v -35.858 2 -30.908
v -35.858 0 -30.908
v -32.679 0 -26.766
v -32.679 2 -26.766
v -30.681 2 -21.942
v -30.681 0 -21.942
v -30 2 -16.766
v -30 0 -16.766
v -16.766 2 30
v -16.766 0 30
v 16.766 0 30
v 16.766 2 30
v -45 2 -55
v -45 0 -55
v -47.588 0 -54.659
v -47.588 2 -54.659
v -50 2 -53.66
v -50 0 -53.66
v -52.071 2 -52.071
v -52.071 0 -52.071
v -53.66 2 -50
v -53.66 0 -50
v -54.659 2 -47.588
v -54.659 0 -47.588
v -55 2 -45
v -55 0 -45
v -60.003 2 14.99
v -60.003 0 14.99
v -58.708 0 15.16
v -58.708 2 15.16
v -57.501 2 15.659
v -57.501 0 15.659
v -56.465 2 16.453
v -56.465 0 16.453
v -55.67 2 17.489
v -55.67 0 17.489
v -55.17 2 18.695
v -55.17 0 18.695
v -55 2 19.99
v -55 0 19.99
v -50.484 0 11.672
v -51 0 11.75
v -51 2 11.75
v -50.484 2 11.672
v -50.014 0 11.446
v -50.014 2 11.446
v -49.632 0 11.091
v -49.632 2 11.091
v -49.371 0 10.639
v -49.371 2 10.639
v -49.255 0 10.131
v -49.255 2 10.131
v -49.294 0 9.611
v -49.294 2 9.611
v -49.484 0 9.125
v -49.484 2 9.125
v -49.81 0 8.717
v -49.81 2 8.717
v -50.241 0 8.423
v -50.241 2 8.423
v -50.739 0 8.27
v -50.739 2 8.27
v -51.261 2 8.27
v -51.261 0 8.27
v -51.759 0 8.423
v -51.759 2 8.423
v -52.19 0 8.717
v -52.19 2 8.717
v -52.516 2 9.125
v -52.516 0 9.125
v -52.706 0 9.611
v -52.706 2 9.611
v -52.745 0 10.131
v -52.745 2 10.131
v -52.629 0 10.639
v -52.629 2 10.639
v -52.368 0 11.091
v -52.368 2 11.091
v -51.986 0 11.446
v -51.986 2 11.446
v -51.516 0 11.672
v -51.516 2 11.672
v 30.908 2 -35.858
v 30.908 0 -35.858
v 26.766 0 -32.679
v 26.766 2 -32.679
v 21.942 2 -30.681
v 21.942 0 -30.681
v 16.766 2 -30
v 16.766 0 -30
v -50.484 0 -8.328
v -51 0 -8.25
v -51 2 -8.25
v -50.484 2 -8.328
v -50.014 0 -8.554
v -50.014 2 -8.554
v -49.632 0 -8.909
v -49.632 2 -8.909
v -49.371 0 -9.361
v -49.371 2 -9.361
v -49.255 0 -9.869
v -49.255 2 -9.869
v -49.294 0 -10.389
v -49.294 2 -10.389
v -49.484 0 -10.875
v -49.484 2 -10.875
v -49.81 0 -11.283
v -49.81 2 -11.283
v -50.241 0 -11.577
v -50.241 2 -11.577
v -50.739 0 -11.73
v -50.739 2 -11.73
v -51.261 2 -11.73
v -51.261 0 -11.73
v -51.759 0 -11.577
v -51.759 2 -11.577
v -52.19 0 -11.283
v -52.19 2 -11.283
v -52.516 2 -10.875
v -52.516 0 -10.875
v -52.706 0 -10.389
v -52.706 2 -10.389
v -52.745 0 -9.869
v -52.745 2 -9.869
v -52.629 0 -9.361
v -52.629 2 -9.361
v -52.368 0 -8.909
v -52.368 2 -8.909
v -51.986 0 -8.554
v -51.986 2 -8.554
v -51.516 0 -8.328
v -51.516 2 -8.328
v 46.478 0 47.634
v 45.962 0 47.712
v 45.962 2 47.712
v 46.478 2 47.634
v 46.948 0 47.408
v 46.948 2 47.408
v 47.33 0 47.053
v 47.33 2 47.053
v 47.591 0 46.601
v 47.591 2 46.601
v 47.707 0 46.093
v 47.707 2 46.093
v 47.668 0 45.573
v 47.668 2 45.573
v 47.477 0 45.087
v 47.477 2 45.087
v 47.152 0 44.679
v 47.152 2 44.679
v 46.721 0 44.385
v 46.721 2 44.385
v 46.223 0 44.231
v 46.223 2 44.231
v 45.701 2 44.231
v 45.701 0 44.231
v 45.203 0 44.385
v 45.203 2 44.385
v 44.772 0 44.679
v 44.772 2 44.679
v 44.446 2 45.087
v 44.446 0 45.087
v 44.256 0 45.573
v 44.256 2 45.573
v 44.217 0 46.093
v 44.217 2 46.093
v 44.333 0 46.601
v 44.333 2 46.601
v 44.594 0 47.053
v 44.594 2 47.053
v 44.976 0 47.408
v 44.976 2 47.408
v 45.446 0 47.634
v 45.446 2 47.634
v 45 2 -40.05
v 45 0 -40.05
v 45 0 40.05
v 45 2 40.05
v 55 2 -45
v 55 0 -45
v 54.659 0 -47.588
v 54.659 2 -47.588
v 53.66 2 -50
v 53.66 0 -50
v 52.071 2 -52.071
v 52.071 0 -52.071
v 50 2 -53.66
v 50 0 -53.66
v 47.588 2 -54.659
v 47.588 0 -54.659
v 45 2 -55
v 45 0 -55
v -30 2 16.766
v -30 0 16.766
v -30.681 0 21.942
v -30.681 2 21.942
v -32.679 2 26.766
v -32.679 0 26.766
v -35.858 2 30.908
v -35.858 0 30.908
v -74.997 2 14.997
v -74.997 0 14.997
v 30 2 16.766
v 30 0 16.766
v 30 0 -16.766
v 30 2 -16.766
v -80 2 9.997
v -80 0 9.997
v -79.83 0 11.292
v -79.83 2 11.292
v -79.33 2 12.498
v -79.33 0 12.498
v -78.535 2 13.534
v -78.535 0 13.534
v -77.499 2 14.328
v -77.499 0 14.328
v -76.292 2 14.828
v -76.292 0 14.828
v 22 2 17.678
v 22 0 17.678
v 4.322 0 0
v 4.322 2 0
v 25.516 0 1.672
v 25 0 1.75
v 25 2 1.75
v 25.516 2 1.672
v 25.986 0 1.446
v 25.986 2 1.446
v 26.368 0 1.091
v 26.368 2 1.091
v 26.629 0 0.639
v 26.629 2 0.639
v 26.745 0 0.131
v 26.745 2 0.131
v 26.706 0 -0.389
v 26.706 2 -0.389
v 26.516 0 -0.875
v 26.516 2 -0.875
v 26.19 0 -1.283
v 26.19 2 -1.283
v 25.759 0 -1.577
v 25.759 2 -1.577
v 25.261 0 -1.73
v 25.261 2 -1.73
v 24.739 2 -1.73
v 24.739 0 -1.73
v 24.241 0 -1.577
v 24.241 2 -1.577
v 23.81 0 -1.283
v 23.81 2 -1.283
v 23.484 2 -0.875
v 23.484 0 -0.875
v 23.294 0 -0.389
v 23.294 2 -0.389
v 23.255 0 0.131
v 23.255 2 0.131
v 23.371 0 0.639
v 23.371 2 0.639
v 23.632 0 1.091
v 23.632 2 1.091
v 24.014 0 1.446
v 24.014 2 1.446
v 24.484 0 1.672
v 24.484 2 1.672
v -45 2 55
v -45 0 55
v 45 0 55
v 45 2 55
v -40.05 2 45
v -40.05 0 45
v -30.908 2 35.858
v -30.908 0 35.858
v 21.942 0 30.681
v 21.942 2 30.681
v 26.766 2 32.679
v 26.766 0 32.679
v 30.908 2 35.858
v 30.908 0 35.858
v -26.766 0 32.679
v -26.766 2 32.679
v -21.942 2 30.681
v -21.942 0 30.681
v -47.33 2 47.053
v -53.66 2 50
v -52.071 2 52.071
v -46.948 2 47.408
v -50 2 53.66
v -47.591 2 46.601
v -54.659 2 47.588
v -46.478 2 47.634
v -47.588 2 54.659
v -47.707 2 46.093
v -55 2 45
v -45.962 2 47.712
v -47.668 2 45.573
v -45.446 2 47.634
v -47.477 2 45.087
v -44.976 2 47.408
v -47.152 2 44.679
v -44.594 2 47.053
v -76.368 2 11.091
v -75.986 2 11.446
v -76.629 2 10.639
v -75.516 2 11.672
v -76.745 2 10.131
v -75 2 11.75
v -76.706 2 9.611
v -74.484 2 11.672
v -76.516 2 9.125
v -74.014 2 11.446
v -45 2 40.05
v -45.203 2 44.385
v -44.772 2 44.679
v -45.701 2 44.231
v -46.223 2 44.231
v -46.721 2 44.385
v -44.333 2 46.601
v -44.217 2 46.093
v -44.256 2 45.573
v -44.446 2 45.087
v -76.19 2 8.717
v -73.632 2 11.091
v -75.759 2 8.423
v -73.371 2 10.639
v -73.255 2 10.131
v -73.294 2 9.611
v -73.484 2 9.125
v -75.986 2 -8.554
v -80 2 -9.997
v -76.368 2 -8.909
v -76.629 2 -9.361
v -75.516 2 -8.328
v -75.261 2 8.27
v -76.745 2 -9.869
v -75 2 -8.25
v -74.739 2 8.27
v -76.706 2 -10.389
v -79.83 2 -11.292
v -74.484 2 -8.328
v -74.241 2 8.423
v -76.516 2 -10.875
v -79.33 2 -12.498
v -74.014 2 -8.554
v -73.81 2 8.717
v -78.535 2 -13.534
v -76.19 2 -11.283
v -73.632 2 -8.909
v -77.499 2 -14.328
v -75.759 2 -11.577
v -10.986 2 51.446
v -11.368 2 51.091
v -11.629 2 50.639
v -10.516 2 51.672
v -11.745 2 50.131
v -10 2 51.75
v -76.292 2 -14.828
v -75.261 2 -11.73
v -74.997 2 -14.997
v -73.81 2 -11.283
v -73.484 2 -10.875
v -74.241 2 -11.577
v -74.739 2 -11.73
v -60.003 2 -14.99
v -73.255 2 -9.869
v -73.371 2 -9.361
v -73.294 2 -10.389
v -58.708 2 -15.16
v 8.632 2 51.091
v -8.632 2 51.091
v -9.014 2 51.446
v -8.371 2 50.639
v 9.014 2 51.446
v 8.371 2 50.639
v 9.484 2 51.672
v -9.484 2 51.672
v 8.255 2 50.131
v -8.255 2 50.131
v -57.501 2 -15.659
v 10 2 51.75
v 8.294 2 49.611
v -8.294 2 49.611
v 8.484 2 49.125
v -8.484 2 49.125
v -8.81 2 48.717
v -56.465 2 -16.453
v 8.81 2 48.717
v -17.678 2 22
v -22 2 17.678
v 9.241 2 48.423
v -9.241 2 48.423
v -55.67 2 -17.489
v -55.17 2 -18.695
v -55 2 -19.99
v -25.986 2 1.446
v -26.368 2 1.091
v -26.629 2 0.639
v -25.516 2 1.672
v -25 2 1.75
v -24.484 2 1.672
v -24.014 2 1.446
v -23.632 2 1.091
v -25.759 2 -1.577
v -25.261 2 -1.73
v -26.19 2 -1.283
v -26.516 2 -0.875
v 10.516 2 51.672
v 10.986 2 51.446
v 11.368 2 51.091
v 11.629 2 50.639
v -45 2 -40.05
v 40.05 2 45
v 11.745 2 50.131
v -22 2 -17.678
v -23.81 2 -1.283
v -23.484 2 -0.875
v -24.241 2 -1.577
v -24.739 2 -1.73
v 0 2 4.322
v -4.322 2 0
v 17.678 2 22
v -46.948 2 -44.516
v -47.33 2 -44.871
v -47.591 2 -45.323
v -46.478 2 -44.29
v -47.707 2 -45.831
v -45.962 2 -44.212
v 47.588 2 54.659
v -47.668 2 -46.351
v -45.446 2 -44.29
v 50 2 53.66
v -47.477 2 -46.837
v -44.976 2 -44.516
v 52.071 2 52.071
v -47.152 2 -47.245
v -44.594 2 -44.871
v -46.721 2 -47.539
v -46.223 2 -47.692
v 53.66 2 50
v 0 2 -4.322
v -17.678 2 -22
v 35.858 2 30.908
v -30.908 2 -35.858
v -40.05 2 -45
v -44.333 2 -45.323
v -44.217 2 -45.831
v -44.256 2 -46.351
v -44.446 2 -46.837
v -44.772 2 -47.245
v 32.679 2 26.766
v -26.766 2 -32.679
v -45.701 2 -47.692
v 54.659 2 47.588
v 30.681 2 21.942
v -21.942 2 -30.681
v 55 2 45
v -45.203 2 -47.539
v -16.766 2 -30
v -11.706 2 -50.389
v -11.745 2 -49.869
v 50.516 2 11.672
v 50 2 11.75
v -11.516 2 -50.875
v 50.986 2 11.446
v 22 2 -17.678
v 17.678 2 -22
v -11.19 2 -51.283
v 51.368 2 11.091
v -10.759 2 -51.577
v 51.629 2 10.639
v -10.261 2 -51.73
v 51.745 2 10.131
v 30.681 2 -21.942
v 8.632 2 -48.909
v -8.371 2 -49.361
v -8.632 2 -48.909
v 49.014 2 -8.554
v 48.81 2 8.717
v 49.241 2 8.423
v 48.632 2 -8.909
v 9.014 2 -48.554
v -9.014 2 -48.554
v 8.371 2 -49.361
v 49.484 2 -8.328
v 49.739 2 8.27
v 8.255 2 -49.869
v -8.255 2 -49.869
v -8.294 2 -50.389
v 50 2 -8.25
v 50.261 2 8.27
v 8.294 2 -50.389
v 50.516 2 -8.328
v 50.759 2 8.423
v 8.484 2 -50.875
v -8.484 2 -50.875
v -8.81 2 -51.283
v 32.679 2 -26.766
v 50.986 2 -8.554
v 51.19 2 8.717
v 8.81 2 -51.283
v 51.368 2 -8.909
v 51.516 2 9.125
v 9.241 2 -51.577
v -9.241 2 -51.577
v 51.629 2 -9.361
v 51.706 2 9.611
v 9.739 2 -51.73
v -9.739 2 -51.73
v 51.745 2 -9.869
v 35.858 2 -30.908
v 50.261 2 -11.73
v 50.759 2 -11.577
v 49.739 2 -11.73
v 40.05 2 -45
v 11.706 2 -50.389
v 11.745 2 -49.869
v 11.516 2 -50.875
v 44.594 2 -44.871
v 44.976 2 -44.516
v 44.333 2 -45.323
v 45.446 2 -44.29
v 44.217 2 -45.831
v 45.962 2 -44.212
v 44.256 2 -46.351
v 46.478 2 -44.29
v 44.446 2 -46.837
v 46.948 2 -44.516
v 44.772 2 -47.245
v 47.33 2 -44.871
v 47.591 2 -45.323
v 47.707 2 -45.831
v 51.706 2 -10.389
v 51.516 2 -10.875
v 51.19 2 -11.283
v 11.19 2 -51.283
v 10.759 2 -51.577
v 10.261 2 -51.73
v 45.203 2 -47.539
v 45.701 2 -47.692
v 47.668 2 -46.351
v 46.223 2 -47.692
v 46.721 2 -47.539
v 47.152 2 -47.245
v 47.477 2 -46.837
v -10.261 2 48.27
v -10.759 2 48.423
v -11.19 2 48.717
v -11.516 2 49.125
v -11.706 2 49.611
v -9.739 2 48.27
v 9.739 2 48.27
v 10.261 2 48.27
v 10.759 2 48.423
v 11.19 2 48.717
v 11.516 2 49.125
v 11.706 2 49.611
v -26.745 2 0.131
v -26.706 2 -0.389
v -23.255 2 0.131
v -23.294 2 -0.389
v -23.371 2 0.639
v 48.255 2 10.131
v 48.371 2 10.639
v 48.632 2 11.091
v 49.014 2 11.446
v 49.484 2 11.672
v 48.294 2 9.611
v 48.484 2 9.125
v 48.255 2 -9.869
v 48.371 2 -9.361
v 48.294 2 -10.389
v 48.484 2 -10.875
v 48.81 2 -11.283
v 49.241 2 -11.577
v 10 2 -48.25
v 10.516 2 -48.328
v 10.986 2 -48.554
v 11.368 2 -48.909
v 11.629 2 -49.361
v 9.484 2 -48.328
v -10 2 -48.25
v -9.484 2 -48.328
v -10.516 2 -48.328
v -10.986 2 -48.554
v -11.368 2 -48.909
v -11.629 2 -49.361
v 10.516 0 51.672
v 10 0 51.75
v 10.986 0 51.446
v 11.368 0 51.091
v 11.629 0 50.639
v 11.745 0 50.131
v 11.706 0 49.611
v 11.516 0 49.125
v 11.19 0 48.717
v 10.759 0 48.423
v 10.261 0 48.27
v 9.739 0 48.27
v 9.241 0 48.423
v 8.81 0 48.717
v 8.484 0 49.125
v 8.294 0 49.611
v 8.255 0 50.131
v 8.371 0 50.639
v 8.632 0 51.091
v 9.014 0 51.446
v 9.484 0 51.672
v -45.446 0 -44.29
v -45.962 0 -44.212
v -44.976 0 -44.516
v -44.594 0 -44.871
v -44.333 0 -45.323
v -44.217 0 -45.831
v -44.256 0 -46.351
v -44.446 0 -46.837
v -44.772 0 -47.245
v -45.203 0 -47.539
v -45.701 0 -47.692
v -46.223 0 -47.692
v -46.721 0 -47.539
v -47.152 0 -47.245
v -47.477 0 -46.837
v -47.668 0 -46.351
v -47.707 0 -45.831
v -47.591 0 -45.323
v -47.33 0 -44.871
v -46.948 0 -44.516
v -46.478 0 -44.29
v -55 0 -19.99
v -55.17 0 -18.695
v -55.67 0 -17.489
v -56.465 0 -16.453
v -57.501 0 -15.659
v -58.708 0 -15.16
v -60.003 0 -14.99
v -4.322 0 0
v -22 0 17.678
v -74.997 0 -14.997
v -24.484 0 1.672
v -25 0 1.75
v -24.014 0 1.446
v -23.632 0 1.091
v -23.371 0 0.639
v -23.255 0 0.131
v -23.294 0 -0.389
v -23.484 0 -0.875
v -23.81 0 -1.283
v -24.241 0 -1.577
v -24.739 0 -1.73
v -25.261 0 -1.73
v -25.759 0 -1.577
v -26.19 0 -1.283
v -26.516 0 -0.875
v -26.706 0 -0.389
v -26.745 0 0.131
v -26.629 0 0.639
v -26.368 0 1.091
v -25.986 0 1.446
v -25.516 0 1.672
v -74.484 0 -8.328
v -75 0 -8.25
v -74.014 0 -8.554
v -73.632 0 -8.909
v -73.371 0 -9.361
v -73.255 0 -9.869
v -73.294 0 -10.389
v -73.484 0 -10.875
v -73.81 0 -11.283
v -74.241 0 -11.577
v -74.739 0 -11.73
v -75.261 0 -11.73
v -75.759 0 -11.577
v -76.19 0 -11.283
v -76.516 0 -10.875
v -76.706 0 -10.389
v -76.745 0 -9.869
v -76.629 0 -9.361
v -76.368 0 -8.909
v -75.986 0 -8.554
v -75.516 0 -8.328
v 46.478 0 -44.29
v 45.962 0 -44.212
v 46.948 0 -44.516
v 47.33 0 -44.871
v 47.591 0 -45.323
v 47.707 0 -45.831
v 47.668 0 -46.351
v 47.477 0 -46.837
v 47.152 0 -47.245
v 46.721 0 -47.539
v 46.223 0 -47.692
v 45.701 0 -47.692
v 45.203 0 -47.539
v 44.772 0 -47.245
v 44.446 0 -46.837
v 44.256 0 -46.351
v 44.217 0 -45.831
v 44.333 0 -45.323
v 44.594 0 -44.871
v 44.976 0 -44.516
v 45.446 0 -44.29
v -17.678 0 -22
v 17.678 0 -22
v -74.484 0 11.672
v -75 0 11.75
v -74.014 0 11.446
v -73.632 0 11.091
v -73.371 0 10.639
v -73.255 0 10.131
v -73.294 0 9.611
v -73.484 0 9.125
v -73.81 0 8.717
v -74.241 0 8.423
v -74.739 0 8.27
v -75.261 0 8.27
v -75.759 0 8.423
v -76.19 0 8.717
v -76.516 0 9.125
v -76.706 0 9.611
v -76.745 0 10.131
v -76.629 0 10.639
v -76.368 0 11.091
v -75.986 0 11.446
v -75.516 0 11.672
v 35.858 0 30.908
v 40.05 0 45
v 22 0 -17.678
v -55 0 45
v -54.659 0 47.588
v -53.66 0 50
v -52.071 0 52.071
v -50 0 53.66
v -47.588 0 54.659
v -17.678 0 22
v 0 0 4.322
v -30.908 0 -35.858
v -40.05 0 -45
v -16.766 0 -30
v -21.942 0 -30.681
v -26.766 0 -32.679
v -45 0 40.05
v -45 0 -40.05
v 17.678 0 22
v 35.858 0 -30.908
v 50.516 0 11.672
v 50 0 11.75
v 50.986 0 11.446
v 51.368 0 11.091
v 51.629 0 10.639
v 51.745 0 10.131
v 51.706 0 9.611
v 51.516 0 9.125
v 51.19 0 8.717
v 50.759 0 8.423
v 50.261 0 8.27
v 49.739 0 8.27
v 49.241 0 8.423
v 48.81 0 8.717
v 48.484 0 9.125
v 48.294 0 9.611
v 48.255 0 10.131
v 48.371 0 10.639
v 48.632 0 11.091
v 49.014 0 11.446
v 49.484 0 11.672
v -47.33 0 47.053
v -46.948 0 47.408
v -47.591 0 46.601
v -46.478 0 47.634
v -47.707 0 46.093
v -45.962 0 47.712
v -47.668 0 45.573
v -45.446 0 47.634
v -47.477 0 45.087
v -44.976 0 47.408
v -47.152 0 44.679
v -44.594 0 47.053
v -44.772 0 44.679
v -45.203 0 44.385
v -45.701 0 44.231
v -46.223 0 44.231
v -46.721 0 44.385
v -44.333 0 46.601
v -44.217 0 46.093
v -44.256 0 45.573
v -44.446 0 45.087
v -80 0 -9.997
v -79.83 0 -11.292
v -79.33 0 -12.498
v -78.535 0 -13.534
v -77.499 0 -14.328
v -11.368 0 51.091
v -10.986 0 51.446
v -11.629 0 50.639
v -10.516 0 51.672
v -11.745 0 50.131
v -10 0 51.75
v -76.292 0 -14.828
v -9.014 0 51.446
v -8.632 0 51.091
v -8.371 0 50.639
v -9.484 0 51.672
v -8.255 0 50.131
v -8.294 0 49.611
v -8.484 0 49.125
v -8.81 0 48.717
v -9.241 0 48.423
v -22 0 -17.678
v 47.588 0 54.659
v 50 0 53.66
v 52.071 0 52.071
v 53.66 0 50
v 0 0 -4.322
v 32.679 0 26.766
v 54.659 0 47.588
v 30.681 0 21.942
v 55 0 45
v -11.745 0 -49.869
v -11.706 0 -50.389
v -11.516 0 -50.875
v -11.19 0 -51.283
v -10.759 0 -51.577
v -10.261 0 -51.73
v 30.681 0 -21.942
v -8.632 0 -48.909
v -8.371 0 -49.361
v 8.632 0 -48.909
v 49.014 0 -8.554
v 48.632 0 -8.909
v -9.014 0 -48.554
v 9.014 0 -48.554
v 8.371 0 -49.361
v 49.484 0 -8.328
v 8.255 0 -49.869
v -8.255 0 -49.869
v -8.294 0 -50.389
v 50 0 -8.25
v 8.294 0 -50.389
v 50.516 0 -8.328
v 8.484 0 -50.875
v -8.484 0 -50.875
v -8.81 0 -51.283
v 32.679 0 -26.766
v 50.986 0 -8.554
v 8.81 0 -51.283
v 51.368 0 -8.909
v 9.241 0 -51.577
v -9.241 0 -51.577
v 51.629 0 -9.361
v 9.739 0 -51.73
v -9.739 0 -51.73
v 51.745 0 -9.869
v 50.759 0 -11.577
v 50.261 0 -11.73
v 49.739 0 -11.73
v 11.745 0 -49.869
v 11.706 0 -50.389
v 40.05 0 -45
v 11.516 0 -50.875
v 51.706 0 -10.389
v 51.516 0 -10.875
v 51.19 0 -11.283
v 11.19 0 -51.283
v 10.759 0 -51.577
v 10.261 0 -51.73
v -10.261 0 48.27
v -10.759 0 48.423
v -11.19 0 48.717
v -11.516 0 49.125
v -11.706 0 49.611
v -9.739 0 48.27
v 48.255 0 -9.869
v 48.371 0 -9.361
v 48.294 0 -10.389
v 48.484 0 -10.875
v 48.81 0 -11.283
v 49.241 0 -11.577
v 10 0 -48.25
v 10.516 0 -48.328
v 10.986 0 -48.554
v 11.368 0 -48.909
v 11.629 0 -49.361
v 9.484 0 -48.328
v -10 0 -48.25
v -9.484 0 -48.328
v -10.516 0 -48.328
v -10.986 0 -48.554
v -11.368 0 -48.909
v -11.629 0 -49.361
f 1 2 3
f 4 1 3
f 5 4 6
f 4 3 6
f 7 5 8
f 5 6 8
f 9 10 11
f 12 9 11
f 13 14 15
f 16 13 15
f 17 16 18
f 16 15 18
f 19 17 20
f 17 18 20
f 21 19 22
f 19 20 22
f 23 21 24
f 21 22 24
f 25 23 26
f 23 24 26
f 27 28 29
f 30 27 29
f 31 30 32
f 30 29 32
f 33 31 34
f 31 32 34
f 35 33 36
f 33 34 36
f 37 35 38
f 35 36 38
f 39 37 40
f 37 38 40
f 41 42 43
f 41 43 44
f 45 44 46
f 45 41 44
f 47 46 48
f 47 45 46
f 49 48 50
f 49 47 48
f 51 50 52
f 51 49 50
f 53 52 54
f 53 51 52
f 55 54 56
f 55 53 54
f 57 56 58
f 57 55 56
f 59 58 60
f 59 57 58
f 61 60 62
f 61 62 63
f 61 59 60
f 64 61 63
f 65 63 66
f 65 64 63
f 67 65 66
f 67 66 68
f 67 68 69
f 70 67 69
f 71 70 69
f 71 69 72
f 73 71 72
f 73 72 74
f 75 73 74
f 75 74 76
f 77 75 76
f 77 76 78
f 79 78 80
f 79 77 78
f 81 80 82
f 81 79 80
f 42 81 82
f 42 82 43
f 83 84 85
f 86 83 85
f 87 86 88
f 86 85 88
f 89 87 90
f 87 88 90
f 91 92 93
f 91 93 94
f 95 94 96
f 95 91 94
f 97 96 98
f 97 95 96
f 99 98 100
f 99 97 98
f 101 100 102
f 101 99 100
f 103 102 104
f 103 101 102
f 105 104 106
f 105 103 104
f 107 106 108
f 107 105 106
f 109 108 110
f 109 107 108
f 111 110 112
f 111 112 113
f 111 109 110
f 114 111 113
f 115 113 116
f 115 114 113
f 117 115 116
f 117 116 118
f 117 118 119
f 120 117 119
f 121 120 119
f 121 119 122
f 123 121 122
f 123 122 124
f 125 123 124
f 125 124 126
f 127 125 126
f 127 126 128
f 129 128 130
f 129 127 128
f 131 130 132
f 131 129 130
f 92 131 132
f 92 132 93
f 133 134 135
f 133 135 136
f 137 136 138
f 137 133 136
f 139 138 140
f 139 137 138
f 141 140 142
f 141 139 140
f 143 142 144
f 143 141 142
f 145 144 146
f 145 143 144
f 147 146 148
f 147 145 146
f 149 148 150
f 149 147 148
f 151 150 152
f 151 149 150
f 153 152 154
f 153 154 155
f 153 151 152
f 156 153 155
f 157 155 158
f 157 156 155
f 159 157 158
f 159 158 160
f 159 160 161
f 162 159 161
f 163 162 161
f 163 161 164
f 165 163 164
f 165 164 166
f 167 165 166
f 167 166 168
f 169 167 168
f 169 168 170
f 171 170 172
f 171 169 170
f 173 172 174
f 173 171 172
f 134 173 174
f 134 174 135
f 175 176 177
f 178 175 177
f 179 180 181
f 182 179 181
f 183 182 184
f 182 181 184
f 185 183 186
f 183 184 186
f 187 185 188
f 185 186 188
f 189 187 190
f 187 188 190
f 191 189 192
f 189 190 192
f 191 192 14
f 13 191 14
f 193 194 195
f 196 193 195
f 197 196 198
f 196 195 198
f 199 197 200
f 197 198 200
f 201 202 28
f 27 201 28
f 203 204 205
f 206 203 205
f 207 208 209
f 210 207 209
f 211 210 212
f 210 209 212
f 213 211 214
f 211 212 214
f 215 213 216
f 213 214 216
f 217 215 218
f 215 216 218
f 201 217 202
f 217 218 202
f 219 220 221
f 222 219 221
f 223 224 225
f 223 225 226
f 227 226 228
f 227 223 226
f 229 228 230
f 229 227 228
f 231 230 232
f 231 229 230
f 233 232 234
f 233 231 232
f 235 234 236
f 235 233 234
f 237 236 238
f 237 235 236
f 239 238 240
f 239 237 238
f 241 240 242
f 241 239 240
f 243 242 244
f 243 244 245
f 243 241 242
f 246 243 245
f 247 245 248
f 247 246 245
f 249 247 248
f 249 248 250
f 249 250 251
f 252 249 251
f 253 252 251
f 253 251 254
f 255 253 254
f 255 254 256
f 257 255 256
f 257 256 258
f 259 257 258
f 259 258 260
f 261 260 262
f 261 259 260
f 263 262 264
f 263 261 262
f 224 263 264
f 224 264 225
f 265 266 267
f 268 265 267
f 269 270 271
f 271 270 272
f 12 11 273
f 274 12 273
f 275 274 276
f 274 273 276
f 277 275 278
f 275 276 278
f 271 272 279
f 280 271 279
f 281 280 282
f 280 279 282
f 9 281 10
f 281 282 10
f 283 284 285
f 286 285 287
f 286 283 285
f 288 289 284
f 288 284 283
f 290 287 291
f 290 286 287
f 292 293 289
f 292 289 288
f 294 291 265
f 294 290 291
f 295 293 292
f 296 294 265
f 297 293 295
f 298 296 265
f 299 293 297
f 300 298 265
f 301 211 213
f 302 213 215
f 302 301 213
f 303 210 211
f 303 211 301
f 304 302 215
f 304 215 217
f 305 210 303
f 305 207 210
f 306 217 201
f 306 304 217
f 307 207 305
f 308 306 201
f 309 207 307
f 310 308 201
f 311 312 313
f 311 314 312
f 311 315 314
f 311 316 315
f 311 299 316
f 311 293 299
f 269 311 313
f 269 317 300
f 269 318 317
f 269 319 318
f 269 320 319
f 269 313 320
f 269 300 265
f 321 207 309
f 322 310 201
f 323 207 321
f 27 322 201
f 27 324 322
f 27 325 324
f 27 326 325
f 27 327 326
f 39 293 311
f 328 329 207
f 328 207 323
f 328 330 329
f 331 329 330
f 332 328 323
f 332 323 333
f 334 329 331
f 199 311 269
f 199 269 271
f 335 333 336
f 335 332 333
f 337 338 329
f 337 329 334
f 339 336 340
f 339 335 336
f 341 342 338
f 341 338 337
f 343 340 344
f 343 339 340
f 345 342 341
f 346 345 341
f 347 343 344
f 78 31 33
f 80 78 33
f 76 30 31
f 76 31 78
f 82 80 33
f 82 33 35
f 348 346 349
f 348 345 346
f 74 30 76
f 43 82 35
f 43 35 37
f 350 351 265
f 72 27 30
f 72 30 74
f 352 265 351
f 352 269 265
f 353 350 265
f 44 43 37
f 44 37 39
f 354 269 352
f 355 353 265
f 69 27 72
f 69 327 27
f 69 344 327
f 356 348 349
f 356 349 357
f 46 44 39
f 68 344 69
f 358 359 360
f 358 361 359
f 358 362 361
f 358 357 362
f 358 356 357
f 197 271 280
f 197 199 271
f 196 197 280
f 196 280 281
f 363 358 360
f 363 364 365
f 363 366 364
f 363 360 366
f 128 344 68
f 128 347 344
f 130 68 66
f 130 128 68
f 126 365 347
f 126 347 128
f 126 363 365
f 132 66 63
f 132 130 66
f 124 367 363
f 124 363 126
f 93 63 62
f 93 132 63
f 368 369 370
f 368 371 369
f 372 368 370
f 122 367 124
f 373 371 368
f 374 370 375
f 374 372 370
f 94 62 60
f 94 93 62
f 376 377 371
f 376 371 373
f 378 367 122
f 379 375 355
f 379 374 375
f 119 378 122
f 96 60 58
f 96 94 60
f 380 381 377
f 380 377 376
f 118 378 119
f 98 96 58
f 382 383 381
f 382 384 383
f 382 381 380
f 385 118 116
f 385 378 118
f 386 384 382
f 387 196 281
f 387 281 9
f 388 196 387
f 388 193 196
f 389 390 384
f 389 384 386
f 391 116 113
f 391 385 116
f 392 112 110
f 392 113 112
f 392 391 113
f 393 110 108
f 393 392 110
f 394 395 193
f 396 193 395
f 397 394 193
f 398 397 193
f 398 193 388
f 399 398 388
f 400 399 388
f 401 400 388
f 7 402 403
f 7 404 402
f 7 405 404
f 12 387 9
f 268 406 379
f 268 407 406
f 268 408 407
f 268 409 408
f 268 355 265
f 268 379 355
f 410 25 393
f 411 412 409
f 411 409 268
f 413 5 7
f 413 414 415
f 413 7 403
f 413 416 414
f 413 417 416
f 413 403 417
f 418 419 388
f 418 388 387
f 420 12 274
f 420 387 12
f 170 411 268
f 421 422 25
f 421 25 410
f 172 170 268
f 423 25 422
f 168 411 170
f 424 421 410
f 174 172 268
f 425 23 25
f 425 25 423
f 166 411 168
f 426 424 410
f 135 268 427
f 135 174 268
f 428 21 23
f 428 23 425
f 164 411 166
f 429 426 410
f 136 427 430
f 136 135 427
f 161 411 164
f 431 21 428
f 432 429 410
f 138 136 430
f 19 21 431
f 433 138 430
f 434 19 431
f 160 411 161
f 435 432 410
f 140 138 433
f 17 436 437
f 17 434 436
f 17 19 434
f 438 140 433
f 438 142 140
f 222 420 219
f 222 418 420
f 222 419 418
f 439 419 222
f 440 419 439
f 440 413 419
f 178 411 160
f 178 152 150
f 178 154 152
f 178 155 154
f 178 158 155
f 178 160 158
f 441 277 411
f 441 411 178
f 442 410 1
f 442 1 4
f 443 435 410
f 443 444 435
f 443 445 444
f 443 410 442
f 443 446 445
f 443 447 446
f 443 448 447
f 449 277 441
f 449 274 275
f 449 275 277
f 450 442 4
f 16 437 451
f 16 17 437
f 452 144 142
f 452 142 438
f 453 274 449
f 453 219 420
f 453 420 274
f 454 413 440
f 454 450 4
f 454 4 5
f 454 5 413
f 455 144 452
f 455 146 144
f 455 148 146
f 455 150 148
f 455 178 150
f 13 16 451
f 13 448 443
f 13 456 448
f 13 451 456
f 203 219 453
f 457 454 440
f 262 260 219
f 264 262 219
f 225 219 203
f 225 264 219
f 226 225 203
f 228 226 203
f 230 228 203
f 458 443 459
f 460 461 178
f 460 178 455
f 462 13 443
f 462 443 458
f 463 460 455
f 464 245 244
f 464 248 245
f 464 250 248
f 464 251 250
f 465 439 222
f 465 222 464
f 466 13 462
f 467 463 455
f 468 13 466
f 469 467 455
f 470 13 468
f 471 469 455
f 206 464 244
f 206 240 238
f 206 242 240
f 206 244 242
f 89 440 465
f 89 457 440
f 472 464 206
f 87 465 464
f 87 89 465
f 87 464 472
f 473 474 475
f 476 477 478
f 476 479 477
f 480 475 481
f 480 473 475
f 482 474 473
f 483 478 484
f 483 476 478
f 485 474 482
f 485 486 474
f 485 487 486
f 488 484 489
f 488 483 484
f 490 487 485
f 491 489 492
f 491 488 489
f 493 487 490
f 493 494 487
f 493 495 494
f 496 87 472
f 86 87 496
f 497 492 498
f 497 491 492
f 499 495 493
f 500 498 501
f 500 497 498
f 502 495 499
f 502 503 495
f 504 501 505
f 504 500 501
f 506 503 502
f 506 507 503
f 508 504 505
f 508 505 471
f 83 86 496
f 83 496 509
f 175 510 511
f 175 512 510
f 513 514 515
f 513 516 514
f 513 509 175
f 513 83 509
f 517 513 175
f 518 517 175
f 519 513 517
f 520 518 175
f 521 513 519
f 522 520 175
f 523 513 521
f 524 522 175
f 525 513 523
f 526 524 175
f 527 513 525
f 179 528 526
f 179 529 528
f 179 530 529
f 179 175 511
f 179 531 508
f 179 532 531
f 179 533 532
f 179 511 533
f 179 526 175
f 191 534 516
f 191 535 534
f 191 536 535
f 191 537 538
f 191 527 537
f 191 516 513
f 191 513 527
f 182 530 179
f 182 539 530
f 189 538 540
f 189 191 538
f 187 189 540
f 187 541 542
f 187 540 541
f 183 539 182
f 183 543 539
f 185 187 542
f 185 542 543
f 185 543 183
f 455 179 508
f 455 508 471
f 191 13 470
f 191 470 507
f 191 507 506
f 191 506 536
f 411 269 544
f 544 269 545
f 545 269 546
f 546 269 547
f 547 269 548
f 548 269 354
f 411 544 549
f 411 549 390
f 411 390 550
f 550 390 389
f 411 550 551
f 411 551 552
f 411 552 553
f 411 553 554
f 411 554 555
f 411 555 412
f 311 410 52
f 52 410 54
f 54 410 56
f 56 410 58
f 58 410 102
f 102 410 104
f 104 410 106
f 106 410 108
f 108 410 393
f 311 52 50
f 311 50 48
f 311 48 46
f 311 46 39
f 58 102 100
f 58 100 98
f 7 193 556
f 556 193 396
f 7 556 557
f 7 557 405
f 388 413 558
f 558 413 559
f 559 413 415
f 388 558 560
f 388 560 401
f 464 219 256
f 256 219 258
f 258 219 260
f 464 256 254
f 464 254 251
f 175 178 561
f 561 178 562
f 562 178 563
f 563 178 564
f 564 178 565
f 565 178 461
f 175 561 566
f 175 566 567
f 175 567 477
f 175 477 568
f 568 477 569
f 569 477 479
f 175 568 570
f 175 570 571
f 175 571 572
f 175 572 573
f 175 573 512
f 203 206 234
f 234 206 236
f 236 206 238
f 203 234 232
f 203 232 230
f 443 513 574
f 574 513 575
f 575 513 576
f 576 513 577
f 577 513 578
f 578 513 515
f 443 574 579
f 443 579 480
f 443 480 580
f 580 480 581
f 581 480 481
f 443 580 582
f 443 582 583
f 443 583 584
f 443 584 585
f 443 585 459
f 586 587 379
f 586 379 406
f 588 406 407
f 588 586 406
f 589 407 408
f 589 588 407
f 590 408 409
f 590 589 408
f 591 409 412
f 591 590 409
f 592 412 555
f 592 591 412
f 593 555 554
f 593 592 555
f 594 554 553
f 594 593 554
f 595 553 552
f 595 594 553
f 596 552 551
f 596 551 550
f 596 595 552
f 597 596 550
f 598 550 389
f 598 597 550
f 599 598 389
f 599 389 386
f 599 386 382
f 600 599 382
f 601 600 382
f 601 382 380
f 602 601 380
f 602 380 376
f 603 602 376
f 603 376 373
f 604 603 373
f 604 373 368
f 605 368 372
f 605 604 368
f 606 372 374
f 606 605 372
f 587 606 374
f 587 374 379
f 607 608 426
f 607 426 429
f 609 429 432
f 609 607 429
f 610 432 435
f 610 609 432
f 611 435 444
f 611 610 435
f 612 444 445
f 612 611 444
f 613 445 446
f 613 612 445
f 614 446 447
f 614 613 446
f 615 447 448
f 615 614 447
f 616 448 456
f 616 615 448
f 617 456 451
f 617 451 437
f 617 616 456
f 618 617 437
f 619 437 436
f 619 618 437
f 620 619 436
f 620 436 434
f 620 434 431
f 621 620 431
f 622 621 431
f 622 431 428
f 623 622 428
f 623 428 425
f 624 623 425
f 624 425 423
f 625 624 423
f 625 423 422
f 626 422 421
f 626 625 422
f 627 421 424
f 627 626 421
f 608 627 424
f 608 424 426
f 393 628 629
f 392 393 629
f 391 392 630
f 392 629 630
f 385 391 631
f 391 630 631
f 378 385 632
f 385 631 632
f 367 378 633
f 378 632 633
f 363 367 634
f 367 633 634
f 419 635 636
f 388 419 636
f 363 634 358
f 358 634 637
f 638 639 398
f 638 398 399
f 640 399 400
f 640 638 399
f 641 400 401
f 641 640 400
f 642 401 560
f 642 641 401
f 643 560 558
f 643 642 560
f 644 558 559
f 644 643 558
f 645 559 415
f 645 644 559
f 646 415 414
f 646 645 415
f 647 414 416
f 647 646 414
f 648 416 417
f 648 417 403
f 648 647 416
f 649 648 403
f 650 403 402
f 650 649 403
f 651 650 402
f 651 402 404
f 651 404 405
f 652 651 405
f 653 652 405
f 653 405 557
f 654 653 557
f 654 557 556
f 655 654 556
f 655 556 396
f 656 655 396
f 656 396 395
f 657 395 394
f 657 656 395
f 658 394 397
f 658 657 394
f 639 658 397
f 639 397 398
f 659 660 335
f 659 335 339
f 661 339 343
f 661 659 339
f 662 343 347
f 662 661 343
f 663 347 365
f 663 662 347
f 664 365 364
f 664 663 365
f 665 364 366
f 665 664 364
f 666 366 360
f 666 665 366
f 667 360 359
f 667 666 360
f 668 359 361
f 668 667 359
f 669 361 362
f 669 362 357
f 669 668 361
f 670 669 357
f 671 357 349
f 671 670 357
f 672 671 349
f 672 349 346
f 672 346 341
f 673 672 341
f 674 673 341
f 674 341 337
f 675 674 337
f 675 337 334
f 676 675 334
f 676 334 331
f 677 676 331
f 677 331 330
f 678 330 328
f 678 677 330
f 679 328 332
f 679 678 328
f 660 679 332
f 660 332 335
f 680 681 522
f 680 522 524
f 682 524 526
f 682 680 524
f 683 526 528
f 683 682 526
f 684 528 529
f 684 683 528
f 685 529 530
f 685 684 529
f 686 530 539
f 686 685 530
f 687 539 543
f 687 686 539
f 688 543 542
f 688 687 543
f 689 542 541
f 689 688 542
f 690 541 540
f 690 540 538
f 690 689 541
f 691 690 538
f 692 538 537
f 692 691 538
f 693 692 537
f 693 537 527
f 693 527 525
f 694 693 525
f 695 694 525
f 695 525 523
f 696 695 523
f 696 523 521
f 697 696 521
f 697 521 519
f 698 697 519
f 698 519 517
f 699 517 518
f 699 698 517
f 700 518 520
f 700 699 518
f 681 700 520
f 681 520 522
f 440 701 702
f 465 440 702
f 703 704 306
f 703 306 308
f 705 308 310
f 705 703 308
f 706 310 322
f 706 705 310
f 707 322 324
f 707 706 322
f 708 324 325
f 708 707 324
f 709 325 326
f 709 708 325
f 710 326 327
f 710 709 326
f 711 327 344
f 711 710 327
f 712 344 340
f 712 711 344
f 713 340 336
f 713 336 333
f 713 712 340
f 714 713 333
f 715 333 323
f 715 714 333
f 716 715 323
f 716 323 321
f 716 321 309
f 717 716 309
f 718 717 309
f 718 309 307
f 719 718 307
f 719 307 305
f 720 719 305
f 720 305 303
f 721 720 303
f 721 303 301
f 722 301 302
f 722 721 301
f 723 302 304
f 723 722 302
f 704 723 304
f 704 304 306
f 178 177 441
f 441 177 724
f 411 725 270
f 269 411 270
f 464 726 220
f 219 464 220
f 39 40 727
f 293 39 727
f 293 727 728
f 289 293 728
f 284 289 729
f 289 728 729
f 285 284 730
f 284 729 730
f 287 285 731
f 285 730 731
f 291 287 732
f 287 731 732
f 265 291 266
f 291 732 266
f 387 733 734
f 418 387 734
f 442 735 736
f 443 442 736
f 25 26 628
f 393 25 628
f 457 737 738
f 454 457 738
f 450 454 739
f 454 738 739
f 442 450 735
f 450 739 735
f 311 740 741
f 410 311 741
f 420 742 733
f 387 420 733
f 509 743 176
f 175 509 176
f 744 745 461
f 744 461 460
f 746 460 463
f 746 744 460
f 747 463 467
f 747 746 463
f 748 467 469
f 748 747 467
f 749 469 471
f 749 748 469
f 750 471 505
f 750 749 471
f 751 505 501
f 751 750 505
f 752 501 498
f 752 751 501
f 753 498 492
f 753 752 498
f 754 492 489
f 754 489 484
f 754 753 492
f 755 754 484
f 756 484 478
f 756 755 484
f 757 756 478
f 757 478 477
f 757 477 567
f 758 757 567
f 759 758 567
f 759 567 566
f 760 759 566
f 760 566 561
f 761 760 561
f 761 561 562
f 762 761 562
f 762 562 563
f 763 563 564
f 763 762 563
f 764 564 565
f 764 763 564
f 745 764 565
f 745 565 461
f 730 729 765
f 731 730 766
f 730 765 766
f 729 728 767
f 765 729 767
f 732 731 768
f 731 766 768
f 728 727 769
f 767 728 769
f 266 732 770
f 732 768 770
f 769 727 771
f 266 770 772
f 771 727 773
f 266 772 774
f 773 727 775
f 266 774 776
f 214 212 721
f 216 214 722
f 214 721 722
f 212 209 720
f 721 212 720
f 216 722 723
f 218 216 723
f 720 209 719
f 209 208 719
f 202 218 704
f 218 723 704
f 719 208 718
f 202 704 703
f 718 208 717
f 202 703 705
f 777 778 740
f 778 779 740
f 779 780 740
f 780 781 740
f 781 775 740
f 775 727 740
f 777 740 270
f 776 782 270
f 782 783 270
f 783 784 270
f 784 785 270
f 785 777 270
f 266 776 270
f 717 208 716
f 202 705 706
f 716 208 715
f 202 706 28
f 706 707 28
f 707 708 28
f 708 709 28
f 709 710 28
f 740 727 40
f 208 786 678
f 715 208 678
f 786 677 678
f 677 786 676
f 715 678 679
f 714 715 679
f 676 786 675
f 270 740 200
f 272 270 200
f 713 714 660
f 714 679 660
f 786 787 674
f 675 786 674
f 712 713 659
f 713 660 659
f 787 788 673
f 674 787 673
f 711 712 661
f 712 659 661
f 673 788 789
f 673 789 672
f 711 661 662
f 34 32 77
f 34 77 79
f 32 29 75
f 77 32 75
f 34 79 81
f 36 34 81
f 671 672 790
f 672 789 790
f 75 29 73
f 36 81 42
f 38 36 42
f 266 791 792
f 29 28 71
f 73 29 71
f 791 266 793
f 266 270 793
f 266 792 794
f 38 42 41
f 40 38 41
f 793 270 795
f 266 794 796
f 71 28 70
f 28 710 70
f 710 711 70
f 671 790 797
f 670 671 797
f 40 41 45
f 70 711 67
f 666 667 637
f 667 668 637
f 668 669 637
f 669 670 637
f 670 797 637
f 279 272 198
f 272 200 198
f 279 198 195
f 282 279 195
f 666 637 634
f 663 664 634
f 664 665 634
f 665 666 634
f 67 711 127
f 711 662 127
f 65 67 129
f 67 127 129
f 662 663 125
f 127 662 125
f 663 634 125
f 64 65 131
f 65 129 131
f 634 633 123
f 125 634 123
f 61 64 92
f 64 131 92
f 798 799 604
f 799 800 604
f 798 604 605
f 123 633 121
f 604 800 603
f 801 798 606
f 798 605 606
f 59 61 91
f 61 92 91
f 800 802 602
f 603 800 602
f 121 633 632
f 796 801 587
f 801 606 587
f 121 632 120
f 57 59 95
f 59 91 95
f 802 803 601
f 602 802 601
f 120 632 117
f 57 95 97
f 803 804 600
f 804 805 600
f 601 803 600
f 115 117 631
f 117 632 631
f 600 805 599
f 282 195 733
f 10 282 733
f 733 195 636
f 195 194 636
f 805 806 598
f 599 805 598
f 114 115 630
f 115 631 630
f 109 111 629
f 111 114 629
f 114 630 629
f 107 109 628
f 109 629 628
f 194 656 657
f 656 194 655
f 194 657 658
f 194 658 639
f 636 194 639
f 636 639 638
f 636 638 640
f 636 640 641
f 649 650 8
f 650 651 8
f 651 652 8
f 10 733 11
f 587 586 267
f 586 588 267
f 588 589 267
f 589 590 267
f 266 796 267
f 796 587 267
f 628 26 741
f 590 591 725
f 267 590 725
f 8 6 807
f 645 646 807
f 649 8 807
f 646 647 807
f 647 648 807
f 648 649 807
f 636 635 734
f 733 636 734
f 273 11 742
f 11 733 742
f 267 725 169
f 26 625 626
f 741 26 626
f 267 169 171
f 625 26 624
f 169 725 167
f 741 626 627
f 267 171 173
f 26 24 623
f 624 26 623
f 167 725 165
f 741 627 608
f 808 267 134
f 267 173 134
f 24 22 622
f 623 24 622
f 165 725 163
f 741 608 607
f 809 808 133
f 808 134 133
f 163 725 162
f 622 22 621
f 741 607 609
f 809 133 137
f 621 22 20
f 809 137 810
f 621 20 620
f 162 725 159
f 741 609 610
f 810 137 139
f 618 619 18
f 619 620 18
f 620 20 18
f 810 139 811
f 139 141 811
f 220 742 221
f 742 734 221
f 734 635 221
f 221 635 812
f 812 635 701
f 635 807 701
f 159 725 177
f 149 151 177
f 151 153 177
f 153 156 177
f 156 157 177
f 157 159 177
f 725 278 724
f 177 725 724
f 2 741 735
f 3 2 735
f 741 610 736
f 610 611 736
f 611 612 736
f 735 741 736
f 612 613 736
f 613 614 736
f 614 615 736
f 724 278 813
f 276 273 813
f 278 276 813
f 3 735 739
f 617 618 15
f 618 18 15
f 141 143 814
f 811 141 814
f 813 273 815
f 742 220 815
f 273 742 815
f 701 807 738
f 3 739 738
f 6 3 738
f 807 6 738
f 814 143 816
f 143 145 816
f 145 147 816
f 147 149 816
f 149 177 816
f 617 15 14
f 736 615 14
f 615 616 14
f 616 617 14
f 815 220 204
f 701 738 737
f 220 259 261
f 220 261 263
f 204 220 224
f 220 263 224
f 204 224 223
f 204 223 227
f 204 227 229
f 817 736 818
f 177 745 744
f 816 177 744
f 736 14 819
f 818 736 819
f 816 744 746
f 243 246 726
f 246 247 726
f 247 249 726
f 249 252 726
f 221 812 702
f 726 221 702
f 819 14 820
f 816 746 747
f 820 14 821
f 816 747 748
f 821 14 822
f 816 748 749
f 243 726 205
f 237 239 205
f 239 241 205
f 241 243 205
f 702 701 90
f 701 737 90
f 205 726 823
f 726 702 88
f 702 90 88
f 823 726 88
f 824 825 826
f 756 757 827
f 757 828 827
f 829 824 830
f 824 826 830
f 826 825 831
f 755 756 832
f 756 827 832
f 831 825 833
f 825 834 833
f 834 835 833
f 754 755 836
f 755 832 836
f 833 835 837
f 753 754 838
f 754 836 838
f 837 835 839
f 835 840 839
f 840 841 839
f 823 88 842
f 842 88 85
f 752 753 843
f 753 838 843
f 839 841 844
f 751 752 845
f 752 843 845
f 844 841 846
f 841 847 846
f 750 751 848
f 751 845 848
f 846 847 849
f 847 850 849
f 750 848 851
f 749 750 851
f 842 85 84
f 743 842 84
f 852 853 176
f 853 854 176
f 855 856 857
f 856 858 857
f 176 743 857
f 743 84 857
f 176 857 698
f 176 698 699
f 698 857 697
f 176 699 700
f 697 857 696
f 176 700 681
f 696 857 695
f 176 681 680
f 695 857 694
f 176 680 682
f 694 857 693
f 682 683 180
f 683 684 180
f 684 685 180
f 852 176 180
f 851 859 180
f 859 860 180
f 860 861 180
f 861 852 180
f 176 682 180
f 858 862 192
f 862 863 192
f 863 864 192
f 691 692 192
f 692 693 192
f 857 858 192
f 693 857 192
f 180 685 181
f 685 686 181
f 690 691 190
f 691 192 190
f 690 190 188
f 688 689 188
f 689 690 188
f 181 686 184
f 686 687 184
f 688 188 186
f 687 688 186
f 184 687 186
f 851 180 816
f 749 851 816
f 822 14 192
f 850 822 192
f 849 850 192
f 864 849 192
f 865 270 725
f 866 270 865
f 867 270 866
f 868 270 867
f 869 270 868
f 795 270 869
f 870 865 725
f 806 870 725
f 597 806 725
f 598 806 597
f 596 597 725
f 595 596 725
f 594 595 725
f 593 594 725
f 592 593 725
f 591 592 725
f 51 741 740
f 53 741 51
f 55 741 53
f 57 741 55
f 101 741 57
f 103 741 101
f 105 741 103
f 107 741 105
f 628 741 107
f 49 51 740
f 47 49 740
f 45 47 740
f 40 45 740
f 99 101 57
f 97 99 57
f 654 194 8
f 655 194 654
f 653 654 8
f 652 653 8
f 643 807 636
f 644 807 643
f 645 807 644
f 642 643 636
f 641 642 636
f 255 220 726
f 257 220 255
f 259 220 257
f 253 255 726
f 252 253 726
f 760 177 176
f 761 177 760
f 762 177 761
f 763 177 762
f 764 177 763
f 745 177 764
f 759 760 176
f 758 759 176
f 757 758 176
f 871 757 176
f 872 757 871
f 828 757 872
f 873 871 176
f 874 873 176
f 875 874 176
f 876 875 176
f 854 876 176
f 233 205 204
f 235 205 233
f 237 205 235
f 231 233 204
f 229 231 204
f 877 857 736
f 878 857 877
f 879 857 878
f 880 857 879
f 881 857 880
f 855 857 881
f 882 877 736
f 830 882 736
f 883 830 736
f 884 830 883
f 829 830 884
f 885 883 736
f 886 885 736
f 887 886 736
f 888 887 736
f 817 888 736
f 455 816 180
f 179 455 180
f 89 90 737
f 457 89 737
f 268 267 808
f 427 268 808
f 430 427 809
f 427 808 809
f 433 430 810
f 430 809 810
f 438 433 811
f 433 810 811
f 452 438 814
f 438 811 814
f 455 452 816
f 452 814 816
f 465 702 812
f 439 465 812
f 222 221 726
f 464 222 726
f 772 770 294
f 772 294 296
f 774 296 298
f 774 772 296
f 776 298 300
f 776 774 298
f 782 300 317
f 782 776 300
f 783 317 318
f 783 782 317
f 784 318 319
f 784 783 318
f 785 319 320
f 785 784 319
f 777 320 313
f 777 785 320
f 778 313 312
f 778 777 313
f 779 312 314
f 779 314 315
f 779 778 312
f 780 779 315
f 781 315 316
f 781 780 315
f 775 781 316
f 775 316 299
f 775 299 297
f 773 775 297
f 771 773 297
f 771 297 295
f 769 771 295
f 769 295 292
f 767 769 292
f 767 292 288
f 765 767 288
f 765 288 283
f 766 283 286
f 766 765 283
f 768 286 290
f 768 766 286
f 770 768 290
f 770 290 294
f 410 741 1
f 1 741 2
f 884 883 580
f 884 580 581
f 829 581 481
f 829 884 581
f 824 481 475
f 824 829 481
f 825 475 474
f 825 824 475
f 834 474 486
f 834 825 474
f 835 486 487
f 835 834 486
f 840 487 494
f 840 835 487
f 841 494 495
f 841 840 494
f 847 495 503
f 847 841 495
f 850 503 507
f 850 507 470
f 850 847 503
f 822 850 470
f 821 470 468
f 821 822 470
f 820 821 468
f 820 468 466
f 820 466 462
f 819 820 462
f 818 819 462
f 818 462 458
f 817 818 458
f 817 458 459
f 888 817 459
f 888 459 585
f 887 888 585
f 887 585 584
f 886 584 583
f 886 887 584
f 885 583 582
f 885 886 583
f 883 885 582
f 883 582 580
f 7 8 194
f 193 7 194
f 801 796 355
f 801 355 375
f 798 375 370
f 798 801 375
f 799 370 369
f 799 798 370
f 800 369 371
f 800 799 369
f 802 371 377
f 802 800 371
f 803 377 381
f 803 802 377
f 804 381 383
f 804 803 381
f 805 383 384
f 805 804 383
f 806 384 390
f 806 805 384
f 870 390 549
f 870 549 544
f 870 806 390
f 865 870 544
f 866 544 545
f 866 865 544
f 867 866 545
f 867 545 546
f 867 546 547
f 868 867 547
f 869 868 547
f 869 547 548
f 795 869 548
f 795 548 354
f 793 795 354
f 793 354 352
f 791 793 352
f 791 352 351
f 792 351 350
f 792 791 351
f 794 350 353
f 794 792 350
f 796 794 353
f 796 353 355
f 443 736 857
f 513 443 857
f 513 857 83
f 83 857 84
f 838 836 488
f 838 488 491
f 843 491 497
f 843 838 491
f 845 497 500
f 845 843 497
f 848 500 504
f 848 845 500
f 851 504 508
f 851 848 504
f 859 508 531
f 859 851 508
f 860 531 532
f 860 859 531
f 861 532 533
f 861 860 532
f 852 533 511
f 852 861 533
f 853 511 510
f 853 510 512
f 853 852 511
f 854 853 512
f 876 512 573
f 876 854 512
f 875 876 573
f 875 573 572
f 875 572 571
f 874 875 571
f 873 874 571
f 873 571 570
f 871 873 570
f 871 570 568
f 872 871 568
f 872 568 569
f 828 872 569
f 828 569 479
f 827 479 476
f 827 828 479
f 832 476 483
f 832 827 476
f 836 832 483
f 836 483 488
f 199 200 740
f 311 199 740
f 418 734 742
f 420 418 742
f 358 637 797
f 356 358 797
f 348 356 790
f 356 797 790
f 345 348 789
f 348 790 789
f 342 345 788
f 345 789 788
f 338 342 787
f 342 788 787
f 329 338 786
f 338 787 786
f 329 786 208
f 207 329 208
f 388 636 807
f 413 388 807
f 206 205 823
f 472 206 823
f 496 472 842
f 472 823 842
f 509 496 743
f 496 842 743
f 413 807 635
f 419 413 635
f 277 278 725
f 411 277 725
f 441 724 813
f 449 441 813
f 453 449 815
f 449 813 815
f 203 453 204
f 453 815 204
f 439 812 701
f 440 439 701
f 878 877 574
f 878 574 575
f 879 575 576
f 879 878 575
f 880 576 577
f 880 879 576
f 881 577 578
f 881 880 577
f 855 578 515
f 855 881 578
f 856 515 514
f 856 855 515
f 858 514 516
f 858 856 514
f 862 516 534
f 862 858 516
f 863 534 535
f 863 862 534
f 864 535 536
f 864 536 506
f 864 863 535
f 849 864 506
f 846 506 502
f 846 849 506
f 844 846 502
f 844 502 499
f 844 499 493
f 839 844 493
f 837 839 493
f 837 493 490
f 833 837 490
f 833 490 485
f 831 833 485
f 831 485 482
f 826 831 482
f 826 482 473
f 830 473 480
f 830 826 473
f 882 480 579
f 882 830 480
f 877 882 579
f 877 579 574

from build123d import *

# Parameters (mm, degrees)
SKETCH_1_R      = 1.75
EXTRUDE_1_DEPTH = 2


with BuildPart() as part:
    # 草图1 → 凸台-拉伸1 (new body)
    with BuildSketch(Plane(origin=(0, 0, 0), x_dir=(1, 0, 0), z_dir=(0, 1, 0))):
        with BuildLine():
            Line((-45, -55), (45, -55))
            ThreePointArc((45, -55), (52.071067812, -52.071067812), (55, -45))
            Line((55, -45), (55, 45))
            ThreePointArc((55, 45), (52.071067812, 52.071067812), (45, 55))
            Line((45, 55), (-45, 55))
            ThreePointArc((-45, 55), (-52.071067812, 52.071067812), (-55, 45))
            Line((-55, 45), (-55, 19.989791925))
            ThreePointArc((-55, 19.989791925), (-56.465368542, 16.453355802), (-60.002552182, 14.989792577))
            Line((-60.002552182, 14.989792577), (-74.997444562, 14.997446515))
            ThreePointArc((-74.997444562, 14.997446515), (-78.534628201, 13.53388329), (-79.999996743, 9.997447167))
            Line((-79.999996743, 9.997447167), (-79.999996743, -9.997447167))
            ThreePointArc((-79.999996743, -9.997447167), (-78.534628201, -13.53388329), (-74.997444562, -14.997446515))
            Line((-74.997444562, -14.997446515), (-60.002552182, -14.989792577))
            ThreePointArc((-60.002552182, -14.989792577), (-56.465368542, -16.453355802), (-55, -19.989791925))
            Line((-55, -19.989791925), (-55, -45))
            ThreePointArc((-55, -45), (-52.071067812, -52.071067812), (-45, -55))
        make_face()
        with Locations(Location((-45.961940777, -45.961940777, 0), (0, 0, 270))):
            Circle(SKETCH_1_R, mode=Mode.SUBTRACT)
        with Locations(Location((-75, -10, 0), (0, 0, 270))):
            Circle(SKETCH_1_R, mode=Mode.SUBTRACT)
        with Locations(Location((-51, -10, 0), (0, 0, 270))):
            Circle(SKETCH_1_R, mode=Mode.SUBTRACT)
        with BuildLine():
            Line((-45, 40.050252532), (-35.857864376, 30.908116908))
            ThreePointArc((-35.857864376, 30.908116908), (-31.52240935, 24.419649932), (-30, 16.765981284))
            Line((-30, 16.765981284), (-30, -16.765981284))
            ThreePointArc((-30, -16.765981284), (-31.52240935, -24.419649932), (-35.857864376, -30.908116908))
            Line((-35.857864376, -30.908116908), (-45, -40.050252532))
            Line((-45, -40.050252532), (-45, 40.050252532))
        make_face(mode=Mode.SUBTRACT)
        with Locations(Location((-10, -50, 0), (0, 0, 270))):
            Circle(SKETCH_1_R, mode=Mode.SUBTRACT)
        with Locations(Location((10, -50, 0), (0, 0, 270))):
            Circle(SKETCH_1_R, mode=Mode.SUBTRACT)
        with BuildLine():
            Line((-40.050252532, -45), (-30.908116908, -35.857864376))
            ThreePointArc((-30.908116908, -35.857864376), (-24.419649932, -31.52240935), (-16.765981284, -30))
            Line((-16.765981284, -30), (16.765981284, -30))
            ThreePointArc((16.765981284, -30), (24.419649932, -31.52240935), (30.908116908, -35.857864376))
            Line((30.908116908, -35.857864376), (40.050252532, -45))
            Line((40.050252532, -45), (-40.050252532, -45))
        make_face(mode=Mode.SUBTRACT)
        with Locations(Location((45.961940777, -45.961940777, 0), (0, 0, 270))):
            Circle(SKETCH_1_R, mode=Mode.SUBTRACT)
        Polygon((0, -4.32233047), (17.67766953, -22), (-17.67766953, -22), align=None, mode=Mode.SUBTRACT)
        with Locations(Location((50, -10, 0), (0, 0, 270))):
            Circle(SKETCH_1_R, mode=Mode.SUBTRACT)
        with Locations(Location((-75, 10, 0), (0, 0, 270))):
            Circle(SKETCH_1_R, mode=Mode.SUBTRACT)
        with Locations(Location((-51, 10, 0), (0, 0, 270))):
            Circle(SKETCH_1_R, mode=Mode.SUBTRACT)
        with Locations(Location((-25, 0, 0), (0, 0, 270))):
            Circle(SKETCH_1_R, mode=Mode.SUBTRACT)
        Polygon((-4.32233047, 0), (-22, -17.67766953), (-22, 17.67766953), align=None, mode=Mode.SUBTRACT)
        with Locations(Location((-45.961940777, 45.961940777, 0), (0, 0, 270))):
            Circle(SKETCH_1_R, mode=Mode.SUBTRACT)
        Polygon((0, 4.32233047), (-17.67766953, 22), (17.67766953, 22), align=None, mode=Mode.SUBTRACT)
        Polygon((4.32233047, 0), (22, 17.67766953), (22, -17.67766953), align=None, mode=Mode.SUBTRACT)
        with Locations(Location((25, 0, 0), (0, 0, 270))):
            Circle(SKETCH_1_R, mode=Mode.SUBTRACT)
        with BuildLine():
            Line((45, -40.050252532), (35.857864376, -30.908116908))
            ThreePointArc((35.857864376, -30.908116908), (31.52240935, -24.419649932), (30, -16.765981284))
            Line((30, -16.765981284), (30, 16.765981284))
            ThreePointArc((30, 16.765981284), (31.52240935, 24.419649932), (35.857864376, 30.908116908))
            Line((35.857864376, 30.908116908), (45, 40.050252532))
            Line((45, 40.050252532), (45, -40.050252532))
        make_face(mode=Mode.SUBTRACT)
        with Locations(Location((50, 10, 0), (0, 0, 270))):
            Circle(SKETCH_1_R, mode=Mode.SUBTRACT)
        with BuildLine():
            ThreePointArc((-16.765981284, 30), (-24.419649932, 31.52240935), (-30.908116908, 35.857864376))
            Line((-30.908116908, 35.857864376), (-40.050252532, 45))
            Line((-40.050252532, 45), (40.050252532, 45))
            Line((40.050252532, 45), (30.908116908, 35.857864376))
            ThreePointArc((30.908116908, 35.857864376), (24.419649932, 31.52240935), (16.765981284, 30))
            Line((16.765981284, 30), (-16.765981284, 30))
        make_face(mode=Mode.SUBTRACT)
        with Locations(Location((-10, 50, 0), (0, 0, 270))):
            Circle(SKETCH_1_R, mode=Mode.SUBTRACT)
        with Locations(Location((10, 50, 0), (0, 0, 270))):
            Circle(SKETCH_1_R, mode=Mode.SUBTRACT)
        with Locations(Location((45.961940777, 45.961940777, 0), (0, 0, 270))):
            Circle(SKETCH_1_R, mode=Mode.SUBTRACT)
    extrude(amount=EXTRUDE_1_DEPTH)


solid = part.part
